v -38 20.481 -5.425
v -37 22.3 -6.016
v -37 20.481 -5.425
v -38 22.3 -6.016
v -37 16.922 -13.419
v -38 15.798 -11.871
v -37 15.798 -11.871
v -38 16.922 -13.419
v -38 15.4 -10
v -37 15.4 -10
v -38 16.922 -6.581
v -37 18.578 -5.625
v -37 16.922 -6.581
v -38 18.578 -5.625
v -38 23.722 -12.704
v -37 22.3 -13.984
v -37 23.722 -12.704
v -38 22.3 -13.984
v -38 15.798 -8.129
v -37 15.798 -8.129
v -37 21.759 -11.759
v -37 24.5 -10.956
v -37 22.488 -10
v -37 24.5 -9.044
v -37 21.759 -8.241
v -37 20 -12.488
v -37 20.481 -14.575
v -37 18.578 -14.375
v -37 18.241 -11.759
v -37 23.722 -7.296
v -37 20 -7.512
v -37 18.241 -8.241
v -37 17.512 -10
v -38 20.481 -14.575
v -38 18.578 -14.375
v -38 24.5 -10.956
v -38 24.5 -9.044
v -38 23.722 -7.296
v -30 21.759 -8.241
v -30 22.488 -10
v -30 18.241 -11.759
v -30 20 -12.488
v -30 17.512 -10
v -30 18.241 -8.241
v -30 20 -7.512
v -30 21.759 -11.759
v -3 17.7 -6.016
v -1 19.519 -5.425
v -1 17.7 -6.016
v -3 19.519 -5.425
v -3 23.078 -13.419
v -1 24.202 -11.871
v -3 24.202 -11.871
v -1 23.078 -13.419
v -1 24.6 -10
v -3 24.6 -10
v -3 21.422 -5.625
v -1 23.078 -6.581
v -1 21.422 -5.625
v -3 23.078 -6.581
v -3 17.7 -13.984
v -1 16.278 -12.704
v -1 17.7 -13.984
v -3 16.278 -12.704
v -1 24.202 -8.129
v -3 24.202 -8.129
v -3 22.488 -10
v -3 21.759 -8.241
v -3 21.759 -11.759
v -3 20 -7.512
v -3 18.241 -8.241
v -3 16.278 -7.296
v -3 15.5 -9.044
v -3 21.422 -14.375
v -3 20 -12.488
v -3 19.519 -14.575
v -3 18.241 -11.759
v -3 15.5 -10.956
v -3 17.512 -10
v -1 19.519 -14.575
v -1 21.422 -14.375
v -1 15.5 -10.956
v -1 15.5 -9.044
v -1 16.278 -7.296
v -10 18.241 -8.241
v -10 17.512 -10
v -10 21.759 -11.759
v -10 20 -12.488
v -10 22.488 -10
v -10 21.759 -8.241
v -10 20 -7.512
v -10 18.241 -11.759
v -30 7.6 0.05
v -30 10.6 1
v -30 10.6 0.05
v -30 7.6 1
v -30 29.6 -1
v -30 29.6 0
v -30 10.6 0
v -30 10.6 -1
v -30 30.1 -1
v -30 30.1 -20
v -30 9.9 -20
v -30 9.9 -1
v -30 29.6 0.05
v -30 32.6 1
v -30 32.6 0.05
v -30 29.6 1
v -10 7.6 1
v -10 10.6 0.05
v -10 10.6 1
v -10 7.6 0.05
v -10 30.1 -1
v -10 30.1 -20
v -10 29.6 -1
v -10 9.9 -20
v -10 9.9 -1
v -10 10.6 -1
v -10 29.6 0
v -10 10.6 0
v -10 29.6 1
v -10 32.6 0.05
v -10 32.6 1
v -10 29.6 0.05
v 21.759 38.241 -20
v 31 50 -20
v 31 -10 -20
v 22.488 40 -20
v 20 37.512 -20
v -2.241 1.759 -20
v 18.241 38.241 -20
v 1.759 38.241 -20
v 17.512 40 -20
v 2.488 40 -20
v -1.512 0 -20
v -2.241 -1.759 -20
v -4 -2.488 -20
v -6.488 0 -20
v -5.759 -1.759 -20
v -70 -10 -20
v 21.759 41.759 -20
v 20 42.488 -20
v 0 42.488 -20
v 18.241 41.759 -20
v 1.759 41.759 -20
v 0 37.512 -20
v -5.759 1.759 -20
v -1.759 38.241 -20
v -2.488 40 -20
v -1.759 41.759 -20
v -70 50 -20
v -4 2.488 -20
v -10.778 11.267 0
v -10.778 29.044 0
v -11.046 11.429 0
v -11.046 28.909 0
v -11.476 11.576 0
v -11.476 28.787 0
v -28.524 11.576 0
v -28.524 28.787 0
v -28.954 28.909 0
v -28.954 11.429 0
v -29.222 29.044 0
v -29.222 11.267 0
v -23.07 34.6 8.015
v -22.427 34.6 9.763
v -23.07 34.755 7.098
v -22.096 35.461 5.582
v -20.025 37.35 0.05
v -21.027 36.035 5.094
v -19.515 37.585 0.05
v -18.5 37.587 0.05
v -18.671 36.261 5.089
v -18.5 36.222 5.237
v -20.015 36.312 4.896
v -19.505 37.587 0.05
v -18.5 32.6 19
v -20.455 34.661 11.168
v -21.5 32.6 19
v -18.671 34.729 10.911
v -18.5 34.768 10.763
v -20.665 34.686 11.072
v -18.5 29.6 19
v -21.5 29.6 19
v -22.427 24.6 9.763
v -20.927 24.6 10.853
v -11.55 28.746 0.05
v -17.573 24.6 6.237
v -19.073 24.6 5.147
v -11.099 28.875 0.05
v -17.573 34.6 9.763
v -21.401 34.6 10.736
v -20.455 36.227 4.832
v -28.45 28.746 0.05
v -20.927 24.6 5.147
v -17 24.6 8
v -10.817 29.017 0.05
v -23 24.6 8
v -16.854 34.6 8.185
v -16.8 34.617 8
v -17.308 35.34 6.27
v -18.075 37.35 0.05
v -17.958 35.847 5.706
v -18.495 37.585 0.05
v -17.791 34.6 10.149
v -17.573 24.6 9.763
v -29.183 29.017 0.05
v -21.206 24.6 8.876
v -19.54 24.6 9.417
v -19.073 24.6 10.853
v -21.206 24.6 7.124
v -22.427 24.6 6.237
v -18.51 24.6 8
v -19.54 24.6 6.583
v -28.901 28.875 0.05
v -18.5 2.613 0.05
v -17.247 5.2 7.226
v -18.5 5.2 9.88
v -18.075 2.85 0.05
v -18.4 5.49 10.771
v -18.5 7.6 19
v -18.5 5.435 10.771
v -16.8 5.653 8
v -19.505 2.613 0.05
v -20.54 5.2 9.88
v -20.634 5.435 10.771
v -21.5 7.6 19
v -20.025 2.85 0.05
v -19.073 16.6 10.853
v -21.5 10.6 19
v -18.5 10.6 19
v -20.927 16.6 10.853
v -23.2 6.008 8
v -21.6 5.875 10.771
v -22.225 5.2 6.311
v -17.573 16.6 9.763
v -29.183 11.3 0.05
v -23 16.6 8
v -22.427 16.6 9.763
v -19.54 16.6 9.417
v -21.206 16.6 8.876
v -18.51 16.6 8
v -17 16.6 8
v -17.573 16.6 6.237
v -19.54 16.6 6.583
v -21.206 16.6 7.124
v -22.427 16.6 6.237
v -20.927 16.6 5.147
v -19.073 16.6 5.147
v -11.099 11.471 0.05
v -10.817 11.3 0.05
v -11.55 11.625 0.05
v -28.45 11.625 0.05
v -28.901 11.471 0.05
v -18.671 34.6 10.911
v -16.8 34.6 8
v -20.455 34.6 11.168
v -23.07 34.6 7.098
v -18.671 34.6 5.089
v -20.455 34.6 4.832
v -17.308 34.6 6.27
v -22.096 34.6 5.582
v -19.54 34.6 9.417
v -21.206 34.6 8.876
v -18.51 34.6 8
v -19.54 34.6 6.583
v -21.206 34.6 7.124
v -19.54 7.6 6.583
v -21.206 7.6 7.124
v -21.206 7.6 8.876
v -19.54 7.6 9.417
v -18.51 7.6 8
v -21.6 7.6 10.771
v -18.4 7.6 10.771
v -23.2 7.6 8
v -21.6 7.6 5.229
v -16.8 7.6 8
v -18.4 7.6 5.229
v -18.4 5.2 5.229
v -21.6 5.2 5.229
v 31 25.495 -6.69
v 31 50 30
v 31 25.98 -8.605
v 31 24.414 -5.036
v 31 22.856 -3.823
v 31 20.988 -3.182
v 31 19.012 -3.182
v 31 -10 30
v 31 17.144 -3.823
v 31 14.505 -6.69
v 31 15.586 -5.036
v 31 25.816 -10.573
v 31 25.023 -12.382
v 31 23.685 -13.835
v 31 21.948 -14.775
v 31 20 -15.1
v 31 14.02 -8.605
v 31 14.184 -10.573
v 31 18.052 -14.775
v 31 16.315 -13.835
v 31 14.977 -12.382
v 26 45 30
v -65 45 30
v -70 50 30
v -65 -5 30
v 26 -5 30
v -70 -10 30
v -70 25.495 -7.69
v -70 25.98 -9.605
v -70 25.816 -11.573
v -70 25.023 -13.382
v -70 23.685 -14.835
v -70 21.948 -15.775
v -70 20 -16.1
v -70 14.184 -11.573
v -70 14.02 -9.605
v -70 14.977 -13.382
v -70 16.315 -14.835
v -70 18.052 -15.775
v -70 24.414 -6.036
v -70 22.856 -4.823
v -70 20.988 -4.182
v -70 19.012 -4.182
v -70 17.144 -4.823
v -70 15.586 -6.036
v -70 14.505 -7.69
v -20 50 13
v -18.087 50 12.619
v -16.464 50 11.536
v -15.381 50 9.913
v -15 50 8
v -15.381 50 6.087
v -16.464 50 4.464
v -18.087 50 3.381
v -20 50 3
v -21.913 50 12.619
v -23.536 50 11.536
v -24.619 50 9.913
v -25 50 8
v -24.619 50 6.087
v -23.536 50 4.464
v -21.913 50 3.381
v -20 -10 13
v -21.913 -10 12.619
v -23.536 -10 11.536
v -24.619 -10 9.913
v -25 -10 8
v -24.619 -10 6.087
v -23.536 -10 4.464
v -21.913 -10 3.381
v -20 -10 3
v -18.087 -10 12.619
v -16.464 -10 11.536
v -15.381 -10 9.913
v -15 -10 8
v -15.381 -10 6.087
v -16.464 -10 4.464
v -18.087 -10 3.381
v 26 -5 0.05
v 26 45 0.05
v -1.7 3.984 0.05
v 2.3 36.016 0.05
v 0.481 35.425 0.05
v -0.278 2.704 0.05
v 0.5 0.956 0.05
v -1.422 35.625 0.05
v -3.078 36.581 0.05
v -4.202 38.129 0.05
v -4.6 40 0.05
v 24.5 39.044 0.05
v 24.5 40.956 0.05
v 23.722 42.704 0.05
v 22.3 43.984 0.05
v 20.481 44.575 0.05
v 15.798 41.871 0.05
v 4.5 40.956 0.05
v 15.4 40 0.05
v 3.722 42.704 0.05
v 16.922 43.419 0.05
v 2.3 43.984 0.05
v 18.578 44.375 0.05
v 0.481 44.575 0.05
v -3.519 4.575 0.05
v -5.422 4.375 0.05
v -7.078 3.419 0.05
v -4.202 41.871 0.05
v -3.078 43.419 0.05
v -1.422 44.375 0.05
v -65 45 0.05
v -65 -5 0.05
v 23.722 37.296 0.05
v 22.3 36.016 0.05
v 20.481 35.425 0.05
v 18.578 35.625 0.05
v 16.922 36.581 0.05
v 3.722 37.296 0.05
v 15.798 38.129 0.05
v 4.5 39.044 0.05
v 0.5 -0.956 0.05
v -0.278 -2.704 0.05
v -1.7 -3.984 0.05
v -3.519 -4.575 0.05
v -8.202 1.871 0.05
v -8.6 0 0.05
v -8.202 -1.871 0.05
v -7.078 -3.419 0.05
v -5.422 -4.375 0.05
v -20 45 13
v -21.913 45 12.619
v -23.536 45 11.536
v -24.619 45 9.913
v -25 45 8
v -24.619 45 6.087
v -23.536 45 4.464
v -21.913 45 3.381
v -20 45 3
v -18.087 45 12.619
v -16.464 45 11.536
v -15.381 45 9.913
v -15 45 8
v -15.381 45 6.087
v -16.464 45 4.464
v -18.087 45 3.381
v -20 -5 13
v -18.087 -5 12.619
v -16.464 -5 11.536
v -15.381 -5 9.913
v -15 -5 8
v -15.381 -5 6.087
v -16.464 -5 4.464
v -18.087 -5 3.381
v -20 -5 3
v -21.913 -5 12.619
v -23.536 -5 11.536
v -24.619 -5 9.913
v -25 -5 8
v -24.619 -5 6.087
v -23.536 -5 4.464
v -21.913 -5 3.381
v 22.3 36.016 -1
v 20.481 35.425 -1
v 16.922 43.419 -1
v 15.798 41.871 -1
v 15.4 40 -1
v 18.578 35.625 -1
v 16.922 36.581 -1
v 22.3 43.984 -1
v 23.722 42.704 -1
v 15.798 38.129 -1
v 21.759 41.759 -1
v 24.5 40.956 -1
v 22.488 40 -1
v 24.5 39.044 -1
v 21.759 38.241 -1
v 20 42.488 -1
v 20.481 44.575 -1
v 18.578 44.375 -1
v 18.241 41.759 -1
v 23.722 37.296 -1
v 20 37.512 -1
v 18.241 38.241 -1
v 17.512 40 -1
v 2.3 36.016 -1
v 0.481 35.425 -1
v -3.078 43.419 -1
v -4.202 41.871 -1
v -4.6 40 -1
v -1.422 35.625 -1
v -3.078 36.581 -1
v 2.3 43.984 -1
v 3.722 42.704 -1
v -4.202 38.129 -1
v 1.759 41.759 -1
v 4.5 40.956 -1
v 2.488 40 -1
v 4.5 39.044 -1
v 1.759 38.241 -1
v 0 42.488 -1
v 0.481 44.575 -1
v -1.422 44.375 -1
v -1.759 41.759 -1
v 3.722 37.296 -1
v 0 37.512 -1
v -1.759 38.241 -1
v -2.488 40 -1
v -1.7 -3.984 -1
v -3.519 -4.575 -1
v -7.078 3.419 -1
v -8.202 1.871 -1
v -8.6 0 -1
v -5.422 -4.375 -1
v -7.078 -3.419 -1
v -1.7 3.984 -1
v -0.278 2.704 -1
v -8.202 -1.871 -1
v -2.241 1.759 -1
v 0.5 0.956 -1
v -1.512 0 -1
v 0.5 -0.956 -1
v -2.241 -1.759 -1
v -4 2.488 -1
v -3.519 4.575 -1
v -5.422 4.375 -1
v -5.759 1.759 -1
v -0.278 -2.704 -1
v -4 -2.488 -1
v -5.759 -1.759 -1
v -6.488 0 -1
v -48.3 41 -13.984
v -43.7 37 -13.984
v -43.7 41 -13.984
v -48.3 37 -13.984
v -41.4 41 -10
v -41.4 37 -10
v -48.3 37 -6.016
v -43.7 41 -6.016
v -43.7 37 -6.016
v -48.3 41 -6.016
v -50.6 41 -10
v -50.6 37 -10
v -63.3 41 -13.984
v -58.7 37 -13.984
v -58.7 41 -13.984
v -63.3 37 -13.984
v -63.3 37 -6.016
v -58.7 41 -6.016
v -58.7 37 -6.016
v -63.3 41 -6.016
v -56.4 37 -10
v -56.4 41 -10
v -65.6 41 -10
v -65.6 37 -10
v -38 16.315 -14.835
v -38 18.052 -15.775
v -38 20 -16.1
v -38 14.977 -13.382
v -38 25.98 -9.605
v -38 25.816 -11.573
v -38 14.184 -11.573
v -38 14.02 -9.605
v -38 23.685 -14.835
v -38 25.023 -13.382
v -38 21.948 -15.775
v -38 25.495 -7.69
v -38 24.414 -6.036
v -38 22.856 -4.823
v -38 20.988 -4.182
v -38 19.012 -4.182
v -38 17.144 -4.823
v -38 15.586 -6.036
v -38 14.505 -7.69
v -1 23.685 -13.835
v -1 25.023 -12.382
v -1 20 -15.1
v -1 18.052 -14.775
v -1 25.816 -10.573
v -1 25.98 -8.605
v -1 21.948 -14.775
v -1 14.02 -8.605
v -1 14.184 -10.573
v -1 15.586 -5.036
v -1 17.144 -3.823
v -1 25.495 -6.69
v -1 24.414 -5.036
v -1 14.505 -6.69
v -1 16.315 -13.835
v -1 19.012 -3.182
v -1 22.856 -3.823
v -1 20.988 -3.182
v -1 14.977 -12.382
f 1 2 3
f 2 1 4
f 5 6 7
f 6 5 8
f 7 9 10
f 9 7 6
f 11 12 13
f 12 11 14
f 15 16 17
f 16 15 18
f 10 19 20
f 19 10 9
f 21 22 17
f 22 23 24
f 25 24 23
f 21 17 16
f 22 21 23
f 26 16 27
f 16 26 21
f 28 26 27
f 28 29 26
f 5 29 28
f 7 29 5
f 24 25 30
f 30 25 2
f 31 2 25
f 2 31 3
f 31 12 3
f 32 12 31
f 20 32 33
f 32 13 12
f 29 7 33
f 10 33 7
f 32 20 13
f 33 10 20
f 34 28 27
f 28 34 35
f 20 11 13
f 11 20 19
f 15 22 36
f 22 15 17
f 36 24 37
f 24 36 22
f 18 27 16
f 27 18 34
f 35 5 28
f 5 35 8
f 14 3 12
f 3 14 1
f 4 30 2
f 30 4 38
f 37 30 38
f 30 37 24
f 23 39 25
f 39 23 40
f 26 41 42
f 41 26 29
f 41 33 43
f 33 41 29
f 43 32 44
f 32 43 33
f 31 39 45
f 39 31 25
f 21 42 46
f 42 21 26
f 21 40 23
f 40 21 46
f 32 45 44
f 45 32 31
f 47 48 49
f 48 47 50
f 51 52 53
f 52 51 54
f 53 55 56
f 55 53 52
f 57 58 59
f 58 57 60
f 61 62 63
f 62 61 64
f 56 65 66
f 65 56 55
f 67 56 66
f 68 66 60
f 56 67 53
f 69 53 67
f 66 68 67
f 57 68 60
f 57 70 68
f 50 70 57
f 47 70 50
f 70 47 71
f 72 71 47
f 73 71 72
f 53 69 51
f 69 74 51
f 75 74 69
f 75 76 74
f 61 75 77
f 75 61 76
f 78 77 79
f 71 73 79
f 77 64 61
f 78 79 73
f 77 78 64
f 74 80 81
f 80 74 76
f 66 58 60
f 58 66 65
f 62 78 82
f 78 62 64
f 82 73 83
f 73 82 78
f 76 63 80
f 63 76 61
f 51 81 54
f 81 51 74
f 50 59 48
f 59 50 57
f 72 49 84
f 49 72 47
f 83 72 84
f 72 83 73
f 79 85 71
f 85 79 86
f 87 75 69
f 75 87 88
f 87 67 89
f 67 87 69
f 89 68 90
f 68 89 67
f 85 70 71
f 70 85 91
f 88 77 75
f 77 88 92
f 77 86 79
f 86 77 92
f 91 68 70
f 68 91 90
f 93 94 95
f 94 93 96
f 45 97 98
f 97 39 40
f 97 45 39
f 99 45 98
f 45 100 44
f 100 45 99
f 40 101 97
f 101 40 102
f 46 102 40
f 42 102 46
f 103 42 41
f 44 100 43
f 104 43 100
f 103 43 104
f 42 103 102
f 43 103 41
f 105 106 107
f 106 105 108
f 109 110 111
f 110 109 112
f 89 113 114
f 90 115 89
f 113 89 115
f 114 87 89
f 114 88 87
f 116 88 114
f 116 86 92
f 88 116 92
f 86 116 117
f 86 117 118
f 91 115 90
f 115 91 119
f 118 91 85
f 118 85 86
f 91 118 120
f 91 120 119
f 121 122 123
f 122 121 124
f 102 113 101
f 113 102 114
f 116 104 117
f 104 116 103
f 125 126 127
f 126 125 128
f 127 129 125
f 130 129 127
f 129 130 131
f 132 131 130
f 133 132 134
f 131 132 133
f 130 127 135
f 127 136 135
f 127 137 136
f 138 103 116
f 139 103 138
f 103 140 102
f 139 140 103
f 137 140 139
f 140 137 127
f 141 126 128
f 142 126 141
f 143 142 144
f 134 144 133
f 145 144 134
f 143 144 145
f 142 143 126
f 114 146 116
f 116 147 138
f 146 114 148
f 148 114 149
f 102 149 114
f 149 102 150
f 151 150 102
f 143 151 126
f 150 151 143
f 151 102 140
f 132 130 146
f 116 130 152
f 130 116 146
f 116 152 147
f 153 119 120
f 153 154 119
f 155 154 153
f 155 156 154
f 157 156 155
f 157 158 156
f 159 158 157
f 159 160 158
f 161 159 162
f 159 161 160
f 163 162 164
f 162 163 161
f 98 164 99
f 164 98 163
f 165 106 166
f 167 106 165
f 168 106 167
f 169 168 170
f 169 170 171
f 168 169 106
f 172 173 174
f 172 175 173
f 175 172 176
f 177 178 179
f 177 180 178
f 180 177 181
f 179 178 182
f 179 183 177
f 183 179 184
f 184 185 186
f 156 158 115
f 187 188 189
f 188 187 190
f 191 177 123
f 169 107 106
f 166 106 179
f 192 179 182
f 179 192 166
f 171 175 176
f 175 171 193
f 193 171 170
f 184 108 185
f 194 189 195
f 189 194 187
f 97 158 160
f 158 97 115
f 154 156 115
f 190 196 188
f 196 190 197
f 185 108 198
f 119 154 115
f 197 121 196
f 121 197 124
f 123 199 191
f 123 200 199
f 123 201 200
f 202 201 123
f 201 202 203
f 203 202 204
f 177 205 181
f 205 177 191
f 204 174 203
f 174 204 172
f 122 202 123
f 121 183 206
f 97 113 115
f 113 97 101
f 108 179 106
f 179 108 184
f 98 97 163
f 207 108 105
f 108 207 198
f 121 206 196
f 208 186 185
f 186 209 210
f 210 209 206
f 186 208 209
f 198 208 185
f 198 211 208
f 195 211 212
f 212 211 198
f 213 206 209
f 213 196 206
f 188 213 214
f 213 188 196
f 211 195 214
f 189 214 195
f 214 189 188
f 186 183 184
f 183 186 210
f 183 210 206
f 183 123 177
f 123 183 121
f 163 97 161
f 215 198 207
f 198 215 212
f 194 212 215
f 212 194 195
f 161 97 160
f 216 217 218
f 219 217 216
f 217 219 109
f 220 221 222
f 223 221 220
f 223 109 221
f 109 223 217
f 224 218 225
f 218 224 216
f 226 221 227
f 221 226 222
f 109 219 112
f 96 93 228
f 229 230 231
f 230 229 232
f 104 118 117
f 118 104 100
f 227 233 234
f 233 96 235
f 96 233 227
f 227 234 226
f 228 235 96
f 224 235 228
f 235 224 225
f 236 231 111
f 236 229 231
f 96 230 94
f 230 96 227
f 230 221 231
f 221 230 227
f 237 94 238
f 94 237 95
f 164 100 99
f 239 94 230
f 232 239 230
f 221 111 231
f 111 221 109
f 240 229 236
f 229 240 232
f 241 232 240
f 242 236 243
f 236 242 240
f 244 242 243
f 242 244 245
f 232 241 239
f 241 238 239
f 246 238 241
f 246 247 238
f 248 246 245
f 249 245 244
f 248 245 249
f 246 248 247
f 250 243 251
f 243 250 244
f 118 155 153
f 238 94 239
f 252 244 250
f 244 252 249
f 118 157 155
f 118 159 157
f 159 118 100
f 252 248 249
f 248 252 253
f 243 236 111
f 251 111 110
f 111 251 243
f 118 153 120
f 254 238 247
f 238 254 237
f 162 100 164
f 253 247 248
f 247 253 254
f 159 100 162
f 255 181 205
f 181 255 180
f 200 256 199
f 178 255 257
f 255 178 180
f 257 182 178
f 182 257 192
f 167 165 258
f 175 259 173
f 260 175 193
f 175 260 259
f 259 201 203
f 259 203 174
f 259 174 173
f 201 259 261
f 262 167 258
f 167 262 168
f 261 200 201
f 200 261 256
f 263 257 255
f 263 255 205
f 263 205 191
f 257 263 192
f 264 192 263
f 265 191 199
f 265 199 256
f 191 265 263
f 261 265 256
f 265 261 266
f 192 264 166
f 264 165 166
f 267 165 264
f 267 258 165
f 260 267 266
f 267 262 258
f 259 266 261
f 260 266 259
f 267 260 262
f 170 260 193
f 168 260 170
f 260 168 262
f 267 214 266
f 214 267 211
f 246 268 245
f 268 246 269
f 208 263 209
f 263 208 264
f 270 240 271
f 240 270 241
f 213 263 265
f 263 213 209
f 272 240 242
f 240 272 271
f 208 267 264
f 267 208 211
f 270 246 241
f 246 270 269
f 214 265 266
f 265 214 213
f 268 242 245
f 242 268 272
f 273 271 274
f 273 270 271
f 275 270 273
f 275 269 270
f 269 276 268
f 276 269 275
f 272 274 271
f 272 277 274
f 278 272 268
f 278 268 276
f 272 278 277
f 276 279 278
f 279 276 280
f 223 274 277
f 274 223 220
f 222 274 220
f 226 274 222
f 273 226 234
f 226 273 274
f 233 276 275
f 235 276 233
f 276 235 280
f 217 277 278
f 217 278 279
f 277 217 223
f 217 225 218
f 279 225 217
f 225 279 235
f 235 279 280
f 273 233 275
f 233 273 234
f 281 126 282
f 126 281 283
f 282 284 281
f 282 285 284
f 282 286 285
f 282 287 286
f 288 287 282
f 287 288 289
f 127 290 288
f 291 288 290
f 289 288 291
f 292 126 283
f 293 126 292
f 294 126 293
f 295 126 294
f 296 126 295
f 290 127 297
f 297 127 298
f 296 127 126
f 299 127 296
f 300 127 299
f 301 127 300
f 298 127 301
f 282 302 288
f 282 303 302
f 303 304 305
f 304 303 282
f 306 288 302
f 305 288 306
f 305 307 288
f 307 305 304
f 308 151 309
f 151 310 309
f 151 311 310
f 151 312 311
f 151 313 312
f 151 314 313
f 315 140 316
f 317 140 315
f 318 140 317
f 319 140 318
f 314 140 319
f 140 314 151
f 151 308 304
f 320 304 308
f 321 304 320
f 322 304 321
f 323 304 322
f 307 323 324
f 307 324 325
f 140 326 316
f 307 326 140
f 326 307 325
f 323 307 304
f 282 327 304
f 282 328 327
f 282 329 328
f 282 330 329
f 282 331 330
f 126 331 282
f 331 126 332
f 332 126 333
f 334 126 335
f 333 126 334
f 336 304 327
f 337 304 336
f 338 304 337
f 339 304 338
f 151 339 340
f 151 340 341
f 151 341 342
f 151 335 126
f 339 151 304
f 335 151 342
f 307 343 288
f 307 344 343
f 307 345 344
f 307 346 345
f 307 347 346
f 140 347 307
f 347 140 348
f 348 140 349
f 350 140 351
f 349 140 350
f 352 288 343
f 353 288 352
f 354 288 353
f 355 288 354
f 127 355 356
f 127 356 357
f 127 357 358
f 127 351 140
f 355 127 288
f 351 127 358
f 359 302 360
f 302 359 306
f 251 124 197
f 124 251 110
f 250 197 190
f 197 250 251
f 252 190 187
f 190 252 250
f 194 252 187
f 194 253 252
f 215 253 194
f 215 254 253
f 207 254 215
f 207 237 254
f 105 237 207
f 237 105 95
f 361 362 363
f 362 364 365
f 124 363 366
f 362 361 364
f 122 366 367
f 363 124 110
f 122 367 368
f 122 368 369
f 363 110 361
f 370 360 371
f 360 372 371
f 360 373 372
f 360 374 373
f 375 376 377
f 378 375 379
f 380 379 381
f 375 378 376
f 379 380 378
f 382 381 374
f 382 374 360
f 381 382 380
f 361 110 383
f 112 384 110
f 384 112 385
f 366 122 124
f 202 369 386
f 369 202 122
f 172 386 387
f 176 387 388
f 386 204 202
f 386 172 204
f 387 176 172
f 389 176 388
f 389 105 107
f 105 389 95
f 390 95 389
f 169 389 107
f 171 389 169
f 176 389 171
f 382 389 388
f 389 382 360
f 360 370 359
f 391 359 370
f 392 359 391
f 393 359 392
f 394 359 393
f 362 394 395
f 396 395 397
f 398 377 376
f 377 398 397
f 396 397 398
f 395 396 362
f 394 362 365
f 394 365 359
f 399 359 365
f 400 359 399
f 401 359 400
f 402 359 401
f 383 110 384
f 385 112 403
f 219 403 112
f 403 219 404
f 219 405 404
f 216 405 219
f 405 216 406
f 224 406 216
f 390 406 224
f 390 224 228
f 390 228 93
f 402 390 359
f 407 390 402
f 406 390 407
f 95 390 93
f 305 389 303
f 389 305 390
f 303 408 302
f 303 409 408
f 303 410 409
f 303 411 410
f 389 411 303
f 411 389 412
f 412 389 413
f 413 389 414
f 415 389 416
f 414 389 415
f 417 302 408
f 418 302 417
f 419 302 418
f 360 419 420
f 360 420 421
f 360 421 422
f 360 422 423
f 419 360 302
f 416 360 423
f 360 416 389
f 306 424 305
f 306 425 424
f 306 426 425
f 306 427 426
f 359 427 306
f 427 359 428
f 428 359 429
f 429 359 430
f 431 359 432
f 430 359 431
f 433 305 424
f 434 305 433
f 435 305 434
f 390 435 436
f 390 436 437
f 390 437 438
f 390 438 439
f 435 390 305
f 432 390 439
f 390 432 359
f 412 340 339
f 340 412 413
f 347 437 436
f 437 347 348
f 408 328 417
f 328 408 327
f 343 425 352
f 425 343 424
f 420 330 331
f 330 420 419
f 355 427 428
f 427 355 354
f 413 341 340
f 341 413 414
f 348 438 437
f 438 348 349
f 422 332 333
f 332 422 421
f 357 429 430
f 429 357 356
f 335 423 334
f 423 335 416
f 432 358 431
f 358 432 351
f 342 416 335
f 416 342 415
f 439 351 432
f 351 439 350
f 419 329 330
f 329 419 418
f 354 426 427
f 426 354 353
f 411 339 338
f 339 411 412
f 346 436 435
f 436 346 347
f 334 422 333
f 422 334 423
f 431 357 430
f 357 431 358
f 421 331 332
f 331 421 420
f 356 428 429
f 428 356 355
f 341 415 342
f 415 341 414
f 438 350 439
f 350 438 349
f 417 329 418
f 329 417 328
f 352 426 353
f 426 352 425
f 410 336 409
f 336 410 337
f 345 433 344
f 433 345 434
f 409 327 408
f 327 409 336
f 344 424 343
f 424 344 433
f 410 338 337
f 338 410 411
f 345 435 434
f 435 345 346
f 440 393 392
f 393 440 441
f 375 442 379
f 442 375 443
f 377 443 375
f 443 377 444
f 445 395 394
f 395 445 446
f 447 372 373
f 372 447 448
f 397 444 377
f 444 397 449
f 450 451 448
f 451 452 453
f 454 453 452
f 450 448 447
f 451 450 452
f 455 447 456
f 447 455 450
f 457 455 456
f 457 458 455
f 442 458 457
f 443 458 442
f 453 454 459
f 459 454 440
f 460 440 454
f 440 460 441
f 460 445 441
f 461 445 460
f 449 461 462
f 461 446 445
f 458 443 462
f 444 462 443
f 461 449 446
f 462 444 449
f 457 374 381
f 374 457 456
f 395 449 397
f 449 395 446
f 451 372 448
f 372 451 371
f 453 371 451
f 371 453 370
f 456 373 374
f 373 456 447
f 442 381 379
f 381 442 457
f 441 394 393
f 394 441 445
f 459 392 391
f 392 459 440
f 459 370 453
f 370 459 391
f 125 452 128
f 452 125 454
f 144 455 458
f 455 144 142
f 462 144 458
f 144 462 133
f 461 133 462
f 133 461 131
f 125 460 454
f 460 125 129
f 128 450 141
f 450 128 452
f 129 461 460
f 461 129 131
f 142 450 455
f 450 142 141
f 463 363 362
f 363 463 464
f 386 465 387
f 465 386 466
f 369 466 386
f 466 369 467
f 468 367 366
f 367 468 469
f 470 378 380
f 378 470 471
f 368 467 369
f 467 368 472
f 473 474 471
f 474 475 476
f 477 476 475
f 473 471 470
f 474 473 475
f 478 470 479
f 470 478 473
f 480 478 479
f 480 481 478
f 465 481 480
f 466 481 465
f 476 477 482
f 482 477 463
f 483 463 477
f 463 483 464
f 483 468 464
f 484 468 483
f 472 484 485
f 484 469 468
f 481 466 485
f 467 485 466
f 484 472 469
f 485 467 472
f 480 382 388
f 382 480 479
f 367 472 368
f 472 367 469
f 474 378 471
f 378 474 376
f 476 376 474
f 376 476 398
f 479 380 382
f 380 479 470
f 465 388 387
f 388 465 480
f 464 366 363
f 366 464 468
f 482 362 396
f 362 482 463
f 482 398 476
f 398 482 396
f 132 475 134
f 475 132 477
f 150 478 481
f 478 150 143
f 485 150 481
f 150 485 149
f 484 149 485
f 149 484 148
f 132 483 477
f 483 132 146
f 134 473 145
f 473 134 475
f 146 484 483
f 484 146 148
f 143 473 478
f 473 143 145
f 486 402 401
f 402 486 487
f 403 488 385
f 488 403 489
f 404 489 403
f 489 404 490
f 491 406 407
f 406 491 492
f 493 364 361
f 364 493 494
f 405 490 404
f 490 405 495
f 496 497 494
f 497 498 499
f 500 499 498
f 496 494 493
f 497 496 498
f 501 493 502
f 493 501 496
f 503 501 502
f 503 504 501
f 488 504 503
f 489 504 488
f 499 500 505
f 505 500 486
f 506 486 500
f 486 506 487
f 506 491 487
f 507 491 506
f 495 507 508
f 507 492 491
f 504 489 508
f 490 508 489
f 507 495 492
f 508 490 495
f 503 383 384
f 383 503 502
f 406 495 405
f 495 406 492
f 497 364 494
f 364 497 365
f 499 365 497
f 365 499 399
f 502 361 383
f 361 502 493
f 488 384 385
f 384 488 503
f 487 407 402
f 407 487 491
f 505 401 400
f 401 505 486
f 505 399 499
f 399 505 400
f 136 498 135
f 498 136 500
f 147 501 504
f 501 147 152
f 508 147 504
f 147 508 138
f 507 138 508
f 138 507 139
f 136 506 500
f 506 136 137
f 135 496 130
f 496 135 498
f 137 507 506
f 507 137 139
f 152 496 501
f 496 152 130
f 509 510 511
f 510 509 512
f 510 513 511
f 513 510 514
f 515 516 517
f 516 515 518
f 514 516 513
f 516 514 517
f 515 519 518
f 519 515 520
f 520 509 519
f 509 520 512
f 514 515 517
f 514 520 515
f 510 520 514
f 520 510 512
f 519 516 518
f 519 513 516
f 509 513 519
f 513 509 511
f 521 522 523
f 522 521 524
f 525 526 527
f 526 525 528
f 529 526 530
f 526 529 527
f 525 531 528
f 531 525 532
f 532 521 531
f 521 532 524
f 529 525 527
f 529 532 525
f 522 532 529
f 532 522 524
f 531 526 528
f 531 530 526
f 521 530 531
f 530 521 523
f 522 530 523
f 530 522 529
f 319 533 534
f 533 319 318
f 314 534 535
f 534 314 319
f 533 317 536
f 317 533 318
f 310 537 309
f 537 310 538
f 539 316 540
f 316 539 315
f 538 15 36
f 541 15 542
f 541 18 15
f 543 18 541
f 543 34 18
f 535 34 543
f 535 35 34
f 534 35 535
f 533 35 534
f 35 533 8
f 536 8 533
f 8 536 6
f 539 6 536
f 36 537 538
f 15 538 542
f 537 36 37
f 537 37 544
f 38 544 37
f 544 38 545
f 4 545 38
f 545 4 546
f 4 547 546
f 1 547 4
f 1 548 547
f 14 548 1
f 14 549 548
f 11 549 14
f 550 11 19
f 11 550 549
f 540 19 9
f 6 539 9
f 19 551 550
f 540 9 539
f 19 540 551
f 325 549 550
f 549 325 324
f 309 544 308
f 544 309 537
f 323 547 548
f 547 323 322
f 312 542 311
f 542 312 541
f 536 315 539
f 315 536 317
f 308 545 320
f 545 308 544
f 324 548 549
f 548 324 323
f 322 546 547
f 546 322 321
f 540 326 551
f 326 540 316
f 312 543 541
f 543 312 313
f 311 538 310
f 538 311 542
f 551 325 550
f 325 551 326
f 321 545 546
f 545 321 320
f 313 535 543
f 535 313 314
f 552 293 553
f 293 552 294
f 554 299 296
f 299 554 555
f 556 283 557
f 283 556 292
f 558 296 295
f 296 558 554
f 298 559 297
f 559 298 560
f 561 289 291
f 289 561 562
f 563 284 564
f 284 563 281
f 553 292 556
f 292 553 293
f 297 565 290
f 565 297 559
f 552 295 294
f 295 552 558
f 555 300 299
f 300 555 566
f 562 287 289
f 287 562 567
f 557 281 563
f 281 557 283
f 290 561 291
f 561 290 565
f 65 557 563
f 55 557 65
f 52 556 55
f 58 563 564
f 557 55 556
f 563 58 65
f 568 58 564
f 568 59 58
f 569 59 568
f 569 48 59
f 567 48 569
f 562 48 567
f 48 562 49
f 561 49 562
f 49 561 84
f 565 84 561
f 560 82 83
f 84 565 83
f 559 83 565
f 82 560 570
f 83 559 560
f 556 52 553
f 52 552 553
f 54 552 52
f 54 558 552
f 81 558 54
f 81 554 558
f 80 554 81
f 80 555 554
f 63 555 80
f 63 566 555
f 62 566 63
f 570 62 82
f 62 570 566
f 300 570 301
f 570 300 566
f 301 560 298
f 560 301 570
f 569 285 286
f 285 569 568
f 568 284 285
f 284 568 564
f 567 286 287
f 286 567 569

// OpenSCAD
// file: MCAD/constants.scad
// MIT license


TAU = 6.2831853071; //2*PI, see http://tauday.com/
PI = TAU/2;

// translates a imperial measurement in inches to meters
mm_per_inch = 25.4;
// file: MCAD/math.scad
// MIT license

include <constants.scad>

function deg(angle) = 360*angle/TAU;
// file: bom.scad
module bom(code, desc, category) {
	echo(str("BOM: ",code," - ", desc, "; ", category));
}
// file: MCAD/shapes.scad
/*
 *  OpenSCAD Shapes Library (www.openscad.org)
 *  Copyright (C) 2009  Catarina Mota
 *  Copyright (C) 2010  Elmo Mäntynen
 *
 *  License: LGPL 2.1 or later
*/

// 2D Shapes
//ngon(sides, radius, center=false);

// 3D Shapes
//box(width, height, depth);
//roundedBox(width, height, depth, factor);
//cone(height, radius);
//ellipticalCylinder(width, height, depth);
//ellipsoid(width, height);
//tube(height, radius, wall, center = false);
//tube2(height, ID, OD, center = false);
//ovalTube(width, height, depth, wall, center = false);
//hexagon(height, depth);
//octagon(height, depth);
//dodecagon(height, depth);
//hexagram(height, depth);
//rightTriangle(adjacent, opposite, depth);
//equiTriangle(side, depth);
//12ptStar(height, depth);

//----------------------

// size is a vector [w, h, d]
module box(width, height, depth) {
  cube([width, height, depth], true);
}

// size is a vector [w, h, d]
module roundedBox(width, height, depth, radius) {
  size=[width, height, depth];
  cube(size - [2*radius,0,0], true);
  cube(size - [0,2*radius,0], true);
  for (x = [radius-size[0]/2, -radius+size[0]/2],
       y = [radius-size[1]/2, -radius+size[1]/2]) {
    translate([x,y,0]) cylinder(r=radius, h=size[2], center=true);
  }
}

module cone(height, radius, center = false) {
  cylinder(height, radius, 0, center);
}

module ellipticalCylinder(w,h, height, center = false) {
  scale([1, h/w, 1]) cylinder(h=height, r=w, center=center);
}

module ellipsoid(w, h, center = false) {
  scale([1, h/w, 1]) sphere(r=w/2, center=center);
}

// wall is wall thickness
module tube(height, radius, wall, center = false) {
  difference() {
    cylinder(h=height, r=radius, center=center);
    cylinder(h=height, r=radius-wall, center=center);
  }
}

// wall is wall thickness
module tube2(height, ID, OD, center = false) {
  difference() {
    cylinder(h=height, r=OD/2, center=center);
    cylinder(h=height, r=ID/2, center=center);
  }
}

// wall is wall thickness
module ovalTube(height, rx, ry, wall, center = false) {
  difference() {
    scale([1, ry/rx, 1]) cylinder(h=height, r=rx, center=center);
    scale([(rx-wall)/rx, (ry-wall)/rx, 1]) cylinder(h=height, r=rx, center=center);
  }
}

// size is the XY plane size, height in Z
module hexagon(size, height) {
  boxWidth = size/1.75;
  for (r = [-60, 0, 60]) rotate([0,0,r]) cube([boxWidth, size, height], true);
}

// size is the XY plane size, height in Z
module octagon(size, height) {
  intersection() {
    cube([size, size, height], true);
    rotate([0,0,45]) cube([size, size, height], true);
  }
}

// size is the XY plane size, height in Z
module dodecagon(size, height) {
  intersection() {
    hexagon(size, height);
    rotate([0,0,90]) hexagon(size, height);
  }
}

// size is the XY plane size, height in Z
module hexagram(size, height) {
  boxWidth=size/1.75;
  for (v = [[0,1],[0,-1],[1,-1]]) {
    intersection() {
      rotate([0,0,60*v[0]]) cube([size, boxWidth, height], true);
      rotate([0,0,60*v[1]]) cube([size, boxWidth, height], true);
    }
  }
}

module rightTriangle(adjacent, opposite, height) {
  difference() {
    translate([-adjacent/2,opposite/2,0]) cube([adjacent, opposite, height], true);
    translate([-adjacent,0,0]) {
      rotate([0,0,atan(opposite/adjacent)]) dislocateBox(adjacent*2, opposite, height+2);
    }
  }
}

module equiTriangle(side, height) {
  difference() {
    translate([-side/2,side/2,0]) cube([side, side, height], true);
    rotate([0,0,30]) dislocateBox(side*2, side, height);
    translate([-side,0,0]) {
      rotate([0,0,60]) dislocateBox(side*2, side, height);
    }
  }
}

module 12ptStar(size, height) {
  starNum = 3;
  starAngle = 360/starNum;
  for (s = [1:starNum]) {
    rotate([0, 0, s*starAngle]) cube([size, size, height], true);
  }
}

//-----------------------
//MOVES THE ROTATION AXIS OF A BOX FROM ITS CENTER TO THE BOTTOM LEFT CORNER
module dislocateBox(w, h, d) {
  translate([0,0,-d/2]) cube([w,h,d]);
}

//-----------------------
// Tests
//module test2D_ellipse(){ellipse(10, 5);}
module test_ellipsoid(){ellipsoid(10, 5);}

//module test2D_egg_outline(){egg_outline();}
// file: MCAD/motors.scad
// Copyright 2010 D1plo1d

// This library is dual licensed under the GPL 3.0 and the GNU Lesser General Public License as per http://creativecommons.org/licenses/LGPL/2.1/ .

include <math.scad>


//generates a motor mount for the specified nema standard #.
module stepper_motor_mount(nema_standard,slide_distance=0, mochup=true, tolerance=0) {
	//dimensions from:
	// http://www.numberfactory.com/NEMA%20Motor%20Dimensions.htm
	if (nema_standard == 17)
	{
		_stepper_motor_mount(
			motor_shaft_diameter = 0.1968*mm_per_inch,
			motor_shaft_length = 0.945*mm_per_inch,
			pilot_diameter = 0.866*mm_per_inch,
			pilot_length = 0.80*mm_per_inch,
			mounting_bolt_circle = 1.725*mm_per_inch,
			bolt_hole_size = 3.5,
			bolt_hole_distance = 1.220*mm_per_inch,
			slide_distance = slide_distance,
			mochup = mochup,
			tolerance=tolerance);
	}
	if (nema_standard == 23)
	{
		_stepper_motor_mount(
			motor_shaft_diameter = 0.250*mm_per_inch,
			motor_shaft_length = 0.81*mm_per_inch,
			pilot_diameter = 1.500*mm_per_inch,
			pilot_length = 0.062*mm_per_inch,
			mounting_bolt_circle = 2.625*mm_per_inch,
			bolt_hole_size = 0.195*mm_per_inch,
			bolt_hole_distance = 1.856*mm_per_inch,
			slide_distance = slide_distance,
			mochup = mochup,
			tolerance=tolerance);
	}
	
}


//inner mehod for creating a stepper motor mount of any dimensions
module _stepper_motor_mount(
	motor_shaft_diameter,
	motor_shaft_length,
	pilot_diameter,
	pilot_length,
	mounting_bolt_circle,
	bolt_hole_size,
	bolt_hole_distance,
	slide_distance = 0,
	motor_length = 40, //arbitray - not standardized
	mochup,
	tolerance = 0
)
{
	union()
	{
	// == centered mount points ==
	//mounting circle inset
	translate([0,slide_distance/2,0]) circle(r = pilot_diameter/2 + tolerance);
	square([pilot_diameter,slide_distance],center=true);
	translate([0,-slide_distance/2,0]) circle(r = pilot_diameter/2 + tolerance);

	//todo: motor shaft hole
	
	//mounting screw holes
	for (x = [-1,1])
	{
		for (y = [-1,1])
		{
			translate([x*bolt_hole_distance/2,y*bolt_hole_distance/2,0])
			{
				translate([0,slide_distance/2,0]) circle(bolt_hole_size/2 + tolerance);
				translate([0,-slide_distance/2,0]) circle(bolt_hole_size/2 + tolerance);
				square([bolt_hole_size+2*tolerance,slide_distance],center=true);
			}
		}
	}
	// == motor mock-up ==
	//motor box
	if (mochup == true)
	{
		%translate([0,0,-5]) cylinder(h = 5, r = pilot_diameter/2);
		%translate(v=[0,0,-motor_length/2])
		{
			cube(size=[bolt_hole_distance+bolt_hole_size+5,bolt_hole_distance+bolt_hole_size+5,motor_length], center = true);
		}
		//shaft
		%translate(v=[0,0,-(motor_length-motor_shaft_length-2)/2])
		{
			%cylinder(r=motor_shaft_diameter/2,h=motor_length+motor_shaft_length--1, center = true);
		}
	}
	}
}
// file: MCAD/materials.scad
/*
 * Material colors.
 * 
 * Originally by Hans Häggström, 2010.
 * Dual licenced under Creative Commons Attribution-Share Alike 3.0 and LGPL2 or later
 */

// Material colors
Oak = [0.65, 0.5, 0.4];
Pine = [0.85, 0.7, 0.45];
Birch = [0.9, 0.8, 0.6];
FiberBoard = [0.7, 0.67, 0.6];
BlackPaint = [0.2, 0.2, 0.2];
Iron = [0.36, 0.33, 0.33];
Steel = [0.65, 0.67, 0.72];
Stainless = [0.45, 0.43, 0.5];
Aluminum = [0.77, 0.77, 0.8];
Brass = [0.88, 0.78, 0.5];
Transparent = [1, 1, 1, 0.2];

// Example, uncomment to view
//color_demo();

module color_demo(){
    // Wood
    colorTest(Oak, 0, 0);
    colorTest(Pine, 1, 0);
    colorTest(Birch, 2, 0);

    // Metals
    colorTest(Iron, 0, 1);
    colorTest(Steel, 1, 1);
    colorTest(Stainless, 2, 1);
    colorTest(Aluminum, 3, 1);

    // Mixboards
    colorTest(FiberBoard, 0, 2);

    // Paints
    colorTest(BlackPaint, 0, 3);
}

module colorTest(col, row=0, c=0) {
  color(col) translate([row * 30,c*30,0]) sphere(r=10);
}
// file: MCAD/units.scad
/*
 * Basic units.
 * 
 * Originally by Hans Häggström, 2010.
 * Dual licenced under Creative Commons Attribution-Share Alike 3.0 and LGPL2 or later
 */


mm = 1;
cm = 10 * mm;
dm = 100 * mm;
m = 1000 * mm;

inch = 25.4 * mm;

X = [1, 0, 0];
Y = [0, 1, 0];
Z = [0, 0, 1];

M3 = 3*mm;
M4 = 4*mm;
M5 = 5*mm;
M6 = 6*mm;
M8 = 8*mm;


// When a small distance is needed to overlap shapes for boolean cutting, etc.
epsilon = 0.01*mm;
// file: vslot.scad
include <MCAD/units.scad>;
include <MCAD/materials.scad>
use <MCAD/shapes.scad>;
use <bom.scad>;

vslot_color_black = [0.27, 0.27, 0.3];
vslot_color = Aluminum;

module vslot(length=50, sections=1, finish, cutout=0) {
	size = sections * 20;
	bom(str("vslot20x", size, "x", length), str("v-slot 20x", size, " (", length , "mm)"), ["rail", "extrusion", "structure"]);
	cutext = [[12.00,4.50],[10.00,4.50],[8.20,2.78],[8.20,5.50],[6.56,5.50],[3.90,2.84],[3.90,0.21],[3.69,0.00],[3.90,-0.21],[3.90,-2.84],[6.56,-5.50],[8.20,-5.50],[8.20,-2.78],[10.00,-4.50],[12.00,-4.50]];
	cutint = [[16.10,0.21],[16.10,2.84],[12.70,6.24],[12.70,8.78],[7.30,8.78],[7.30,6.24],[3.90,2.84],[3.90,0.21],[3.69,0.00],[3.90,-0.21],[3.90,-2.84],[7.30,-6.24],[7.30,-8.78],[12.70,-8.78],[12.70,-6.24],[16.10,-2.84],[16.10,-0.21],[16.31,0.00],];
	cutcorner = [[8.20,8.20],[6.57,8.20],[6.57,7.66],[7.66,6.57],[8.20,6.57]];

	module profile() {
        
		difference() {
         
			translate([0,0,length/2])
			roundedBox(20 * sections, 20, length, 1.5);
         if (cutout == 0){
			for(i = [0,180]) rotate([0,0,-i]) translate([10 * (sections - 1), 0, -epsilon/2]) {
				linear_extrude(length+20) polygon(cutext);
				translate([5,-2.89,-20]) cube([10,5.78,length+40]);
			}
          
			for(i = [90,270]) rotate([0,0,-i])
				for(j = [0:sections-1]) translate([0, (sections - 1) * 10 - 20 * j, -epsilon/2]) {
					linear_extrude(length+epsilon) polygon(cutext);
					translate([5,-2.89,-20]) cube([10,5.78,length+40]);
				}

			for(i = [0:sections-1]) translate([i * 20 - 10 * (sections - 1),0,-epsilon/2])
				cylinder(length+20, 2.1, 2.1);

			for(i = [90,270]) rotate([0,0,-i])
				translate([0,(sections - 1) * 10,-epsilon/2])
				linear_extrude(length+epsilon) polygon(cutcorner);
			for(i = [ 0,180]) rotate([0,0,-i])
				translate([(sections - 1) * 10,0,-epsilon/2])
				linear_extrude(length+epsilon) polygon(cutcorner);

			if(sections > 1)
				for(i = [0:sections-2]) translate([(sections - 3) * 10 - i * 20, 0, -epsilon/2])
					linear_extrude(length+epsilon) polygon(cutint);
                      }
		}
	}

      if (cutout == 1){
		 translate([0,0,length/2]) box(20 * sections, 20.2, length);
          } else {
	     if(finish)
		   color(finish) profile();
	     else
		   color(vslot_color) profile();
         }
}

module vslot20x20(length, finish) { vslot(length, 1, finish); }
module vslot20x20_cutout(length, finish) { vslot(length, 1, finish, 1); }


module vslot20x40(length, finish) { vslot(length, 2, finish); }
module vslot20x40_cutout(length, finish) { vslot(length, 2, finish, 1); }

module vslot20x60(length, finish) { vslot(length, 3, finish); }
module vslot20x60_cutout(length, finish) { vslot(length, 3, finish, 1); }

module vslot20x80(length, finish) { vslot(length, 4, finish); }
module vslot20x80_cutout(length, finish) { vslot(length, 4, finish, 1); }


module vslot_test() {
	$fn = 32;

	vslot20x20(100);

	translate([0, 40, 0])
	vslot20x40(100, vslot_color_black);

	translate([0, 80, 0])
	vslot20x60(100);

	translate([0, 120, 0])
	vslot20x80(100, vslot_color_black);

    translate([0,140,0]) vslot20x20_cutout(100);
}

vslot_test();
// file: MCAD/nuts_and_bolts.scad
// Copyright 2010 D1plo1d

// This library is dual licensed under the GPL 3.0 and the GNU Lesser General Public License as per http://creativecommons.org/licenses/LGPL/2.1/ .

//testNutsAndBolts();

module SKIPtestNutsAndBolts()
{
	$fn = 360;
	translate([0,15])nutHole(3, proj=2);
	boltHole(3, length= 30, proj=2);
}

MM = "mm";
INCH = "inch"; //Not yet supported

//Based on: http://www.roymech.co.uk/Useful_Tables/Screws/Hex_Screws.htm
METRIC_NUT_AC_WIDTHS =
[
	-1, //0 index is not used but reduces computation
	-1,
	-1,
	6.40,//m3
	8.10,//m4
	9.20,//m5
	11.50,//m6
	-1,
	15.00,//m8
	-1,
	19.60,//m10
	-1,
	22.10,//m12
	-1,
	-1,
	-1,
	27.70,//m16
	-1,
	-1,
	-1,
	34.60,//m20
	-1,
	-1,
	-1,
	41.60,//m24
	-1,
	-1,
	-1,
	-1,
	-1,
	53.1,//m30
	-1,
	-1,
	-1,
	-1,
	-1,
	63.5//m36
];
METRIC_NUT_THICKNESS =
[
	-1, //0 index is not used but reduces computation
	-1,
	-1,
	2.40,//m3
	3.20,//m4
	4.00,//m5
	5.00,//m6
	-1,
	6.50,//m8
	-1,
	8.00,//m10
	-1,
	10.00,//m12
	-1,
	-1,
	-1,
	13.00,//m16
	-1,
	-1,
	-1,
	16.00//m20
	-1,
	-1,
	-1,
	19.00,//m24
	-1,
	-1,
	-1,
	-1,
	-1,
	24.00,//m30
	-1,
	-1,
	-1,
	-1,
	-1,
	29.00//m36
];

COURSE_METRIC_BOLT_MAJOR_THREAD_DIAMETERS =
[//based on max values
	-1, //0 index is not used but reduces computation
	-1,
	-1,
	2.98,//m3
	3.978,//m4
	4.976,//m5
	5.974,//m6
	-1,
	7.972,//m8
	-1,
	9.968,//m10
	-1,
	11.966,//m12
	-1,
	-1,
	-1,
	15.962,//m16
	-1,
	-1,
	-1,
	19.958,//m20
	-1,
	-1,
	-1,
	23.952,//m24
	-1,
	-1,
	-1,
	-1,
	-1,
	29.947,//m30
	-1,
	-1,
	-1,
	-1,
	-1,
	35.940//m36
];

module nutHole(size, units=MM, tolerance = +0.0001, proj = -1)
{
	//takes a metric screw/nut size and looksup nut dimensions
	radius = METRIC_NUT_AC_WIDTHS[size]/2+tolerance;
	height = METRIC_NUT_THICKNESS[size]+tolerance;
	if (proj == -1)
	{
		cylinder(r= radius, h=height, $fn = 6, center=[0,0]);
	}
	if (proj == 1)
	{
		circle(r= radius, $fn = 6);
	}
	if (proj == 2)
	{
		translate([-radius/2, 0])
			square([radius*2, height]);
	}
}

module boltHole(size, units=MM, length, tolerance = +0.0001, proj = -1)
{
	radius = COURSE_METRIC_BOLT_MAJOR_THREAD_DIAMETERS[size]/2+tolerance;
//TODO: proper screw cap values
	capHeight = METRIC_NUT_THICKNESS[size]+tolerance; //METRIC_BOLT_CAP_HEIGHTS[size]+tolerance;
	capRadius = METRIC_NUT_AC_WIDTHS[size]/2+tolerance; //METRIC_BOLT_CAP_RADIUS[size]+tolerance;

	if (proj == -1)
	{
	translate([0, 0, -capHeight])
		cylinder(r= capRadius, h=capHeight);
	cylinder(r = radius, h = length);
	}
	if (proj == 1)
	{
		circle(r = radius);
	}
	if (proj == 2)
	{
		translate([-capRadius/2, -capHeight])
			square([capRadius*2, capHeight]);
		square([radius*2, length]);
	}
}
// file: pulley.scad
use <MCAD/nuts_and_bolts.scad>;

module pulley_wall(xside)
{
   hull(){
       translate([0,0,0]) cube([20,3,2]);
       translate([8.5,0,18]) cube([3,3,2]);
       if (xside==0){
          translate([8.5,7,0]) cube([1,1,1]);
          translate([10,4,9]) rotate([90,0,0]) cylinder(r=3,h=10);
          
         } else {
          translate([8.5,-5,0]) cube([1,1,1]);
          translate([10,8,9]) rotate([90,0,0]) cylinder(r=3,h=10);
         }
       }
    
}

module pulley_body()
{
    translate([0,0,0])   pulley_wall(1);
    translate([0,22,0])  pulley_wall(0);
    %translate([10,-2,9]) rotate([90,0,180]) boltHole(3,length=28);
    %translate([10,27,9]) rotate([90,0,180]) nutHole(3); 
}

module pulley_cuts()
{
    translate([10,-2,9]) rotate([90,0,180]) boltHole(3,length=28);
    translate([10,25,9]) rotate([90,0,180]) nutHole(3);  
}

module pulley()
{
	difference(){
        translate([23,21,-12]) rotate([90,0,270]) pulley_body();
        translate([23,21,-12]) rotate([90,0,270]) pulley_cuts();
        }
    

}



pulley();
// file: nemamount.scad
include <MCAD/units.scad>;
include <MCAD/materials.scad>
include <MCAD/stepper.scad>
include <MCAD/motors.scad>
use <MCAD/shapes.scad>;
$fn = 32;




module motor_support(ht)
{
   difference(){
	  translate([-22.5,23.5,0]) rotate([90,0,0]) motor_support_body(ht);
      translate([0,1,0]) rotate([90,0,0]) motor_support_cuts(ht);
      }
}

module motor_support_body(ht)
{
	cube([45,ht,48.5]);

}


module motor_support_cuts(ht)
{
// Motor shaft/pulley cutout.
      translate([0,.1,0]) rotate([90, 0, 0]) cylinder(r=12, h=ht*2, center=true, $fn=60);
      // NEMA 17 stepper motor mounting screws.
      for (x = [-1, 1]) for (z = [-1, 1]) {
        scale([x, 1, z]) translate([15.5, .1, 15.5]) {
          rotate([90, 0, 0]) cylinder(r=4, h=ht*2, center=true, $fn=12);
          }
        }
}



module nema_geared_cutout()
{
    //pulley opening
    translate([16,1,21]) rotate([90,0,0]){
      cylinder (h=22, r=6.6);

      rotate([0,0,45]) {
        translate([14,0,0]) cylinder(h=22, r=1.6, $fn=12);
        translate([0,14,0]) cylinder(h=22, r=1.6, $fn=12);
        translate([-14,0,0]) cylinder(h=22, r=1.6, $fn=12);
        translate([0,-14,0]) cylinder(h=22, r=1.6, $fn=12);
      }
     
    }

    //gearhead indentation
    translate([16,-5,21]) rotate([90,0,0]) cylinder (h=3.35, r=11.25);

  
    
}

module nema_cutout()
{
// Motor shaft/pulley cutout.
      rotate([90, 0, 0]) cylinder(r=12, h=20, center=true, $fn=60);
      // NEMA 17 stepper motor mounting screws.
      for (x = [-1, 1]) for (z = [-1, 1]) {
        scale([x, 1, z]) translate([15.5, -5, 15.5]) {
          rotate([90, 0, 0]) cylinder(r=1.65, h=20, center=true, $fn=12);
          }
        }
}

module nema_motor()
{
   union(){
     nema_mount();
     %translate([0,-4,1]) rotate([90,0,0]) motor(Nema17, size=NemaLong , dualAxis=false);
     }
}

module nema_motor_inverse()
{
   union(){
     nema_mount_inverse();
     %translate([0,-4,1]) rotate([90,0,0]) motor(Nema17, size=NemaLong , dualAxis=false);
     }
}

module nema_geared_motor_inverse()
{
   union(){
     nema_geared_inverse();
     %translate([16,-7,22]) rotate([90,0,180]) motor(Nema17, NemaLong, dualAxis=false);
    
     }
}

module nema_geared_motor()
{
   union(){
     nema_geared_mount();
     %translate([16,-7,22]) rotate([90,0,180]) motor(Nema17, NemaLong, dualAxis=false);
    
     }
}

module nema_geared_mount()
{
   difference(){
      union(){
           translate([-6,-6,0]) rotate([90,0,0]) cube([45,45,7]);
           translate([-6,-13,-4]) rotate([0,0,0]) cube([45,25,5]);
           translate([-6,-13,44]) rotate([0,0,0]) cube([45,25,5]);
           }
      translate([0,0,1]) nema_geared_cutout();
      }


}

module nema_geared_inverse()
{
   difference(){
      union(){
           translate([-6,-6,0]) rotate([90,0,0]) cube([45,45,7]);
           translate([-6,-31,-4]) rotate([0,0,0]) cube([45,25,5]);
           translate([-6,-31,44]) rotate([0,0,0]) cube([45,25,5]);
           }
      translate([0,0,1]) nema_geared_cutout();
      }


}

module nema_mount_inverse()
{
   difference(){
      union(){
        translate([-22.5,0,-21.5]) rotate([90,0,0]) cube([45,45,5]);
        translate([-22.5,-5,-25]) rotate([0,0,0]) cube([45,25,5]);
        }
      translate([0,0,1]) nema_cutout();
      }
   //nema_cutout();
}

module nema_mount()
{
   difference(){
      union(){
        translate([-22.5,0,-21.5]) rotate([90,0,0]) cube([45,45,5]);
        translate([-22.5,-25,-25]) rotate([0,0,0]) cube([45,25,5]);
        }
      translate([0,0,1]) nema_cutout();
      }
   //nema_cutout();
}

//nema_motor_inverse();
translate([0,0,40]) rotate([270,0,0]) nema_motor();
translate([0,0,0]) motor_support(40);
//nema_geared_motor();
//nema_geared_motor_inverse();
// file: mountblock.scad
use <vslot.scad>;
use <MCAD/nuts_and_bolts.scad>;


module mountblock_body()
{
	cube([40,40,20]);
	translate([20,20,0]) %vslot20x20(200);
     %translate([37,20,10]) rotate([90,0,270]) boltHole(5, length=18);
     %translate([3,20,10]) rotate([90,0,90]) boltHole(5, length=18);
}


module mountblock_cuts()
{
	translate([20,20,-0.2]) vslot20x20_cutout(80.1);
    translate([37,20,10]) rotate([90,0,270]) boltHole(5, length=18);
    translate([3,20,10]) rotate([90,0,90]) boltHole(5, length=18);
}


module mountblock()
{
	difference(){
         mountblock_body();
         mountblock_cuts();
         }

}


mountblock();
// main file
use <mountblock.scad>;
use <nemamount.scad>;
use <pulley.scad>;
use <MCAD/nuts_and_bolts.scad>;

module square_tube(x,y,z,t=5)
{
	difference(){
	   cube([x,y,z]);
       translate([t/2,t/2,0.05]) cube([x-t,y-t,z+.1]);
       }
    

}

module zmotor_body()
{
    translate([0,0,0]) rotate([0,180,0]) mountblock();
    translate([-31,20.6,22]) rotate([90,90,0]) pulley();
	//translate([-40,-2,39]) rotate([0,90,90]) nema_geared_motor();
    translate([-70,-10,-20]) cube([31,60,20]);
    translate([-41,-10,-20]) cube([41,10,20]);
    translate([-41,40,-20]) cube([41,10,20]);
    translate([0,-10,-20]) cube([31,60,20]);
    %translate([-46,41,-10]) rotate([90,0,0]) nutHole(5);
    
   // %translate([-38,20,-10.1]) rotate([0,90,180]) cylinder(r=6,h=33);
    
    %translate([20,40,-1]) rotate([0,180,0]) boltHole(5,length=30);
    %translate([ 0,40,-1]) rotate([0,180,0]) boltHole(5,length=30);
    %translate([-4,0,-1]) rotate([0,180,0]) boltHole(5,length=50);
    difference(){
          translate([-70,-10,0]) square_tube(101,60,30,10);
          translate([-20,55,8]) rotate([90,90,0]) cylinder(r=5, h=70);
          }
   // %translate([-1,20,-9.1]) rotate([0,90,0]) cylinder(r=6,h=34);
}

module zmotor_cuts()
{
    translate([-46,41,-10]) rotate([90,0,0]) nutHole(5);
    translate([-61,41,-10]) rotate([90,0,0]) nutHole(5);
    translate([20,40,-1]) rotate([0,180,0]) boltHole(5,length=30);
    translate([ 0,40,-1]) rotate([0,180,0]) boltHole(5,length=30);
    translate([-38,20,-10.1]) rotate([0,90,180]) cylinder(r=6,h=34);
    translate([-1,20,-9.1]) rotate([0,90,0]) cylinder(r=6,h=50);
    translate([-4,0,-1]) rotate([0,180,0]) boltHole(5,length=50);
    
}





module zmotor()
{
   difference(){
       zmotor_body();
       zmotor_cuts();
       }
}


zmotor();
